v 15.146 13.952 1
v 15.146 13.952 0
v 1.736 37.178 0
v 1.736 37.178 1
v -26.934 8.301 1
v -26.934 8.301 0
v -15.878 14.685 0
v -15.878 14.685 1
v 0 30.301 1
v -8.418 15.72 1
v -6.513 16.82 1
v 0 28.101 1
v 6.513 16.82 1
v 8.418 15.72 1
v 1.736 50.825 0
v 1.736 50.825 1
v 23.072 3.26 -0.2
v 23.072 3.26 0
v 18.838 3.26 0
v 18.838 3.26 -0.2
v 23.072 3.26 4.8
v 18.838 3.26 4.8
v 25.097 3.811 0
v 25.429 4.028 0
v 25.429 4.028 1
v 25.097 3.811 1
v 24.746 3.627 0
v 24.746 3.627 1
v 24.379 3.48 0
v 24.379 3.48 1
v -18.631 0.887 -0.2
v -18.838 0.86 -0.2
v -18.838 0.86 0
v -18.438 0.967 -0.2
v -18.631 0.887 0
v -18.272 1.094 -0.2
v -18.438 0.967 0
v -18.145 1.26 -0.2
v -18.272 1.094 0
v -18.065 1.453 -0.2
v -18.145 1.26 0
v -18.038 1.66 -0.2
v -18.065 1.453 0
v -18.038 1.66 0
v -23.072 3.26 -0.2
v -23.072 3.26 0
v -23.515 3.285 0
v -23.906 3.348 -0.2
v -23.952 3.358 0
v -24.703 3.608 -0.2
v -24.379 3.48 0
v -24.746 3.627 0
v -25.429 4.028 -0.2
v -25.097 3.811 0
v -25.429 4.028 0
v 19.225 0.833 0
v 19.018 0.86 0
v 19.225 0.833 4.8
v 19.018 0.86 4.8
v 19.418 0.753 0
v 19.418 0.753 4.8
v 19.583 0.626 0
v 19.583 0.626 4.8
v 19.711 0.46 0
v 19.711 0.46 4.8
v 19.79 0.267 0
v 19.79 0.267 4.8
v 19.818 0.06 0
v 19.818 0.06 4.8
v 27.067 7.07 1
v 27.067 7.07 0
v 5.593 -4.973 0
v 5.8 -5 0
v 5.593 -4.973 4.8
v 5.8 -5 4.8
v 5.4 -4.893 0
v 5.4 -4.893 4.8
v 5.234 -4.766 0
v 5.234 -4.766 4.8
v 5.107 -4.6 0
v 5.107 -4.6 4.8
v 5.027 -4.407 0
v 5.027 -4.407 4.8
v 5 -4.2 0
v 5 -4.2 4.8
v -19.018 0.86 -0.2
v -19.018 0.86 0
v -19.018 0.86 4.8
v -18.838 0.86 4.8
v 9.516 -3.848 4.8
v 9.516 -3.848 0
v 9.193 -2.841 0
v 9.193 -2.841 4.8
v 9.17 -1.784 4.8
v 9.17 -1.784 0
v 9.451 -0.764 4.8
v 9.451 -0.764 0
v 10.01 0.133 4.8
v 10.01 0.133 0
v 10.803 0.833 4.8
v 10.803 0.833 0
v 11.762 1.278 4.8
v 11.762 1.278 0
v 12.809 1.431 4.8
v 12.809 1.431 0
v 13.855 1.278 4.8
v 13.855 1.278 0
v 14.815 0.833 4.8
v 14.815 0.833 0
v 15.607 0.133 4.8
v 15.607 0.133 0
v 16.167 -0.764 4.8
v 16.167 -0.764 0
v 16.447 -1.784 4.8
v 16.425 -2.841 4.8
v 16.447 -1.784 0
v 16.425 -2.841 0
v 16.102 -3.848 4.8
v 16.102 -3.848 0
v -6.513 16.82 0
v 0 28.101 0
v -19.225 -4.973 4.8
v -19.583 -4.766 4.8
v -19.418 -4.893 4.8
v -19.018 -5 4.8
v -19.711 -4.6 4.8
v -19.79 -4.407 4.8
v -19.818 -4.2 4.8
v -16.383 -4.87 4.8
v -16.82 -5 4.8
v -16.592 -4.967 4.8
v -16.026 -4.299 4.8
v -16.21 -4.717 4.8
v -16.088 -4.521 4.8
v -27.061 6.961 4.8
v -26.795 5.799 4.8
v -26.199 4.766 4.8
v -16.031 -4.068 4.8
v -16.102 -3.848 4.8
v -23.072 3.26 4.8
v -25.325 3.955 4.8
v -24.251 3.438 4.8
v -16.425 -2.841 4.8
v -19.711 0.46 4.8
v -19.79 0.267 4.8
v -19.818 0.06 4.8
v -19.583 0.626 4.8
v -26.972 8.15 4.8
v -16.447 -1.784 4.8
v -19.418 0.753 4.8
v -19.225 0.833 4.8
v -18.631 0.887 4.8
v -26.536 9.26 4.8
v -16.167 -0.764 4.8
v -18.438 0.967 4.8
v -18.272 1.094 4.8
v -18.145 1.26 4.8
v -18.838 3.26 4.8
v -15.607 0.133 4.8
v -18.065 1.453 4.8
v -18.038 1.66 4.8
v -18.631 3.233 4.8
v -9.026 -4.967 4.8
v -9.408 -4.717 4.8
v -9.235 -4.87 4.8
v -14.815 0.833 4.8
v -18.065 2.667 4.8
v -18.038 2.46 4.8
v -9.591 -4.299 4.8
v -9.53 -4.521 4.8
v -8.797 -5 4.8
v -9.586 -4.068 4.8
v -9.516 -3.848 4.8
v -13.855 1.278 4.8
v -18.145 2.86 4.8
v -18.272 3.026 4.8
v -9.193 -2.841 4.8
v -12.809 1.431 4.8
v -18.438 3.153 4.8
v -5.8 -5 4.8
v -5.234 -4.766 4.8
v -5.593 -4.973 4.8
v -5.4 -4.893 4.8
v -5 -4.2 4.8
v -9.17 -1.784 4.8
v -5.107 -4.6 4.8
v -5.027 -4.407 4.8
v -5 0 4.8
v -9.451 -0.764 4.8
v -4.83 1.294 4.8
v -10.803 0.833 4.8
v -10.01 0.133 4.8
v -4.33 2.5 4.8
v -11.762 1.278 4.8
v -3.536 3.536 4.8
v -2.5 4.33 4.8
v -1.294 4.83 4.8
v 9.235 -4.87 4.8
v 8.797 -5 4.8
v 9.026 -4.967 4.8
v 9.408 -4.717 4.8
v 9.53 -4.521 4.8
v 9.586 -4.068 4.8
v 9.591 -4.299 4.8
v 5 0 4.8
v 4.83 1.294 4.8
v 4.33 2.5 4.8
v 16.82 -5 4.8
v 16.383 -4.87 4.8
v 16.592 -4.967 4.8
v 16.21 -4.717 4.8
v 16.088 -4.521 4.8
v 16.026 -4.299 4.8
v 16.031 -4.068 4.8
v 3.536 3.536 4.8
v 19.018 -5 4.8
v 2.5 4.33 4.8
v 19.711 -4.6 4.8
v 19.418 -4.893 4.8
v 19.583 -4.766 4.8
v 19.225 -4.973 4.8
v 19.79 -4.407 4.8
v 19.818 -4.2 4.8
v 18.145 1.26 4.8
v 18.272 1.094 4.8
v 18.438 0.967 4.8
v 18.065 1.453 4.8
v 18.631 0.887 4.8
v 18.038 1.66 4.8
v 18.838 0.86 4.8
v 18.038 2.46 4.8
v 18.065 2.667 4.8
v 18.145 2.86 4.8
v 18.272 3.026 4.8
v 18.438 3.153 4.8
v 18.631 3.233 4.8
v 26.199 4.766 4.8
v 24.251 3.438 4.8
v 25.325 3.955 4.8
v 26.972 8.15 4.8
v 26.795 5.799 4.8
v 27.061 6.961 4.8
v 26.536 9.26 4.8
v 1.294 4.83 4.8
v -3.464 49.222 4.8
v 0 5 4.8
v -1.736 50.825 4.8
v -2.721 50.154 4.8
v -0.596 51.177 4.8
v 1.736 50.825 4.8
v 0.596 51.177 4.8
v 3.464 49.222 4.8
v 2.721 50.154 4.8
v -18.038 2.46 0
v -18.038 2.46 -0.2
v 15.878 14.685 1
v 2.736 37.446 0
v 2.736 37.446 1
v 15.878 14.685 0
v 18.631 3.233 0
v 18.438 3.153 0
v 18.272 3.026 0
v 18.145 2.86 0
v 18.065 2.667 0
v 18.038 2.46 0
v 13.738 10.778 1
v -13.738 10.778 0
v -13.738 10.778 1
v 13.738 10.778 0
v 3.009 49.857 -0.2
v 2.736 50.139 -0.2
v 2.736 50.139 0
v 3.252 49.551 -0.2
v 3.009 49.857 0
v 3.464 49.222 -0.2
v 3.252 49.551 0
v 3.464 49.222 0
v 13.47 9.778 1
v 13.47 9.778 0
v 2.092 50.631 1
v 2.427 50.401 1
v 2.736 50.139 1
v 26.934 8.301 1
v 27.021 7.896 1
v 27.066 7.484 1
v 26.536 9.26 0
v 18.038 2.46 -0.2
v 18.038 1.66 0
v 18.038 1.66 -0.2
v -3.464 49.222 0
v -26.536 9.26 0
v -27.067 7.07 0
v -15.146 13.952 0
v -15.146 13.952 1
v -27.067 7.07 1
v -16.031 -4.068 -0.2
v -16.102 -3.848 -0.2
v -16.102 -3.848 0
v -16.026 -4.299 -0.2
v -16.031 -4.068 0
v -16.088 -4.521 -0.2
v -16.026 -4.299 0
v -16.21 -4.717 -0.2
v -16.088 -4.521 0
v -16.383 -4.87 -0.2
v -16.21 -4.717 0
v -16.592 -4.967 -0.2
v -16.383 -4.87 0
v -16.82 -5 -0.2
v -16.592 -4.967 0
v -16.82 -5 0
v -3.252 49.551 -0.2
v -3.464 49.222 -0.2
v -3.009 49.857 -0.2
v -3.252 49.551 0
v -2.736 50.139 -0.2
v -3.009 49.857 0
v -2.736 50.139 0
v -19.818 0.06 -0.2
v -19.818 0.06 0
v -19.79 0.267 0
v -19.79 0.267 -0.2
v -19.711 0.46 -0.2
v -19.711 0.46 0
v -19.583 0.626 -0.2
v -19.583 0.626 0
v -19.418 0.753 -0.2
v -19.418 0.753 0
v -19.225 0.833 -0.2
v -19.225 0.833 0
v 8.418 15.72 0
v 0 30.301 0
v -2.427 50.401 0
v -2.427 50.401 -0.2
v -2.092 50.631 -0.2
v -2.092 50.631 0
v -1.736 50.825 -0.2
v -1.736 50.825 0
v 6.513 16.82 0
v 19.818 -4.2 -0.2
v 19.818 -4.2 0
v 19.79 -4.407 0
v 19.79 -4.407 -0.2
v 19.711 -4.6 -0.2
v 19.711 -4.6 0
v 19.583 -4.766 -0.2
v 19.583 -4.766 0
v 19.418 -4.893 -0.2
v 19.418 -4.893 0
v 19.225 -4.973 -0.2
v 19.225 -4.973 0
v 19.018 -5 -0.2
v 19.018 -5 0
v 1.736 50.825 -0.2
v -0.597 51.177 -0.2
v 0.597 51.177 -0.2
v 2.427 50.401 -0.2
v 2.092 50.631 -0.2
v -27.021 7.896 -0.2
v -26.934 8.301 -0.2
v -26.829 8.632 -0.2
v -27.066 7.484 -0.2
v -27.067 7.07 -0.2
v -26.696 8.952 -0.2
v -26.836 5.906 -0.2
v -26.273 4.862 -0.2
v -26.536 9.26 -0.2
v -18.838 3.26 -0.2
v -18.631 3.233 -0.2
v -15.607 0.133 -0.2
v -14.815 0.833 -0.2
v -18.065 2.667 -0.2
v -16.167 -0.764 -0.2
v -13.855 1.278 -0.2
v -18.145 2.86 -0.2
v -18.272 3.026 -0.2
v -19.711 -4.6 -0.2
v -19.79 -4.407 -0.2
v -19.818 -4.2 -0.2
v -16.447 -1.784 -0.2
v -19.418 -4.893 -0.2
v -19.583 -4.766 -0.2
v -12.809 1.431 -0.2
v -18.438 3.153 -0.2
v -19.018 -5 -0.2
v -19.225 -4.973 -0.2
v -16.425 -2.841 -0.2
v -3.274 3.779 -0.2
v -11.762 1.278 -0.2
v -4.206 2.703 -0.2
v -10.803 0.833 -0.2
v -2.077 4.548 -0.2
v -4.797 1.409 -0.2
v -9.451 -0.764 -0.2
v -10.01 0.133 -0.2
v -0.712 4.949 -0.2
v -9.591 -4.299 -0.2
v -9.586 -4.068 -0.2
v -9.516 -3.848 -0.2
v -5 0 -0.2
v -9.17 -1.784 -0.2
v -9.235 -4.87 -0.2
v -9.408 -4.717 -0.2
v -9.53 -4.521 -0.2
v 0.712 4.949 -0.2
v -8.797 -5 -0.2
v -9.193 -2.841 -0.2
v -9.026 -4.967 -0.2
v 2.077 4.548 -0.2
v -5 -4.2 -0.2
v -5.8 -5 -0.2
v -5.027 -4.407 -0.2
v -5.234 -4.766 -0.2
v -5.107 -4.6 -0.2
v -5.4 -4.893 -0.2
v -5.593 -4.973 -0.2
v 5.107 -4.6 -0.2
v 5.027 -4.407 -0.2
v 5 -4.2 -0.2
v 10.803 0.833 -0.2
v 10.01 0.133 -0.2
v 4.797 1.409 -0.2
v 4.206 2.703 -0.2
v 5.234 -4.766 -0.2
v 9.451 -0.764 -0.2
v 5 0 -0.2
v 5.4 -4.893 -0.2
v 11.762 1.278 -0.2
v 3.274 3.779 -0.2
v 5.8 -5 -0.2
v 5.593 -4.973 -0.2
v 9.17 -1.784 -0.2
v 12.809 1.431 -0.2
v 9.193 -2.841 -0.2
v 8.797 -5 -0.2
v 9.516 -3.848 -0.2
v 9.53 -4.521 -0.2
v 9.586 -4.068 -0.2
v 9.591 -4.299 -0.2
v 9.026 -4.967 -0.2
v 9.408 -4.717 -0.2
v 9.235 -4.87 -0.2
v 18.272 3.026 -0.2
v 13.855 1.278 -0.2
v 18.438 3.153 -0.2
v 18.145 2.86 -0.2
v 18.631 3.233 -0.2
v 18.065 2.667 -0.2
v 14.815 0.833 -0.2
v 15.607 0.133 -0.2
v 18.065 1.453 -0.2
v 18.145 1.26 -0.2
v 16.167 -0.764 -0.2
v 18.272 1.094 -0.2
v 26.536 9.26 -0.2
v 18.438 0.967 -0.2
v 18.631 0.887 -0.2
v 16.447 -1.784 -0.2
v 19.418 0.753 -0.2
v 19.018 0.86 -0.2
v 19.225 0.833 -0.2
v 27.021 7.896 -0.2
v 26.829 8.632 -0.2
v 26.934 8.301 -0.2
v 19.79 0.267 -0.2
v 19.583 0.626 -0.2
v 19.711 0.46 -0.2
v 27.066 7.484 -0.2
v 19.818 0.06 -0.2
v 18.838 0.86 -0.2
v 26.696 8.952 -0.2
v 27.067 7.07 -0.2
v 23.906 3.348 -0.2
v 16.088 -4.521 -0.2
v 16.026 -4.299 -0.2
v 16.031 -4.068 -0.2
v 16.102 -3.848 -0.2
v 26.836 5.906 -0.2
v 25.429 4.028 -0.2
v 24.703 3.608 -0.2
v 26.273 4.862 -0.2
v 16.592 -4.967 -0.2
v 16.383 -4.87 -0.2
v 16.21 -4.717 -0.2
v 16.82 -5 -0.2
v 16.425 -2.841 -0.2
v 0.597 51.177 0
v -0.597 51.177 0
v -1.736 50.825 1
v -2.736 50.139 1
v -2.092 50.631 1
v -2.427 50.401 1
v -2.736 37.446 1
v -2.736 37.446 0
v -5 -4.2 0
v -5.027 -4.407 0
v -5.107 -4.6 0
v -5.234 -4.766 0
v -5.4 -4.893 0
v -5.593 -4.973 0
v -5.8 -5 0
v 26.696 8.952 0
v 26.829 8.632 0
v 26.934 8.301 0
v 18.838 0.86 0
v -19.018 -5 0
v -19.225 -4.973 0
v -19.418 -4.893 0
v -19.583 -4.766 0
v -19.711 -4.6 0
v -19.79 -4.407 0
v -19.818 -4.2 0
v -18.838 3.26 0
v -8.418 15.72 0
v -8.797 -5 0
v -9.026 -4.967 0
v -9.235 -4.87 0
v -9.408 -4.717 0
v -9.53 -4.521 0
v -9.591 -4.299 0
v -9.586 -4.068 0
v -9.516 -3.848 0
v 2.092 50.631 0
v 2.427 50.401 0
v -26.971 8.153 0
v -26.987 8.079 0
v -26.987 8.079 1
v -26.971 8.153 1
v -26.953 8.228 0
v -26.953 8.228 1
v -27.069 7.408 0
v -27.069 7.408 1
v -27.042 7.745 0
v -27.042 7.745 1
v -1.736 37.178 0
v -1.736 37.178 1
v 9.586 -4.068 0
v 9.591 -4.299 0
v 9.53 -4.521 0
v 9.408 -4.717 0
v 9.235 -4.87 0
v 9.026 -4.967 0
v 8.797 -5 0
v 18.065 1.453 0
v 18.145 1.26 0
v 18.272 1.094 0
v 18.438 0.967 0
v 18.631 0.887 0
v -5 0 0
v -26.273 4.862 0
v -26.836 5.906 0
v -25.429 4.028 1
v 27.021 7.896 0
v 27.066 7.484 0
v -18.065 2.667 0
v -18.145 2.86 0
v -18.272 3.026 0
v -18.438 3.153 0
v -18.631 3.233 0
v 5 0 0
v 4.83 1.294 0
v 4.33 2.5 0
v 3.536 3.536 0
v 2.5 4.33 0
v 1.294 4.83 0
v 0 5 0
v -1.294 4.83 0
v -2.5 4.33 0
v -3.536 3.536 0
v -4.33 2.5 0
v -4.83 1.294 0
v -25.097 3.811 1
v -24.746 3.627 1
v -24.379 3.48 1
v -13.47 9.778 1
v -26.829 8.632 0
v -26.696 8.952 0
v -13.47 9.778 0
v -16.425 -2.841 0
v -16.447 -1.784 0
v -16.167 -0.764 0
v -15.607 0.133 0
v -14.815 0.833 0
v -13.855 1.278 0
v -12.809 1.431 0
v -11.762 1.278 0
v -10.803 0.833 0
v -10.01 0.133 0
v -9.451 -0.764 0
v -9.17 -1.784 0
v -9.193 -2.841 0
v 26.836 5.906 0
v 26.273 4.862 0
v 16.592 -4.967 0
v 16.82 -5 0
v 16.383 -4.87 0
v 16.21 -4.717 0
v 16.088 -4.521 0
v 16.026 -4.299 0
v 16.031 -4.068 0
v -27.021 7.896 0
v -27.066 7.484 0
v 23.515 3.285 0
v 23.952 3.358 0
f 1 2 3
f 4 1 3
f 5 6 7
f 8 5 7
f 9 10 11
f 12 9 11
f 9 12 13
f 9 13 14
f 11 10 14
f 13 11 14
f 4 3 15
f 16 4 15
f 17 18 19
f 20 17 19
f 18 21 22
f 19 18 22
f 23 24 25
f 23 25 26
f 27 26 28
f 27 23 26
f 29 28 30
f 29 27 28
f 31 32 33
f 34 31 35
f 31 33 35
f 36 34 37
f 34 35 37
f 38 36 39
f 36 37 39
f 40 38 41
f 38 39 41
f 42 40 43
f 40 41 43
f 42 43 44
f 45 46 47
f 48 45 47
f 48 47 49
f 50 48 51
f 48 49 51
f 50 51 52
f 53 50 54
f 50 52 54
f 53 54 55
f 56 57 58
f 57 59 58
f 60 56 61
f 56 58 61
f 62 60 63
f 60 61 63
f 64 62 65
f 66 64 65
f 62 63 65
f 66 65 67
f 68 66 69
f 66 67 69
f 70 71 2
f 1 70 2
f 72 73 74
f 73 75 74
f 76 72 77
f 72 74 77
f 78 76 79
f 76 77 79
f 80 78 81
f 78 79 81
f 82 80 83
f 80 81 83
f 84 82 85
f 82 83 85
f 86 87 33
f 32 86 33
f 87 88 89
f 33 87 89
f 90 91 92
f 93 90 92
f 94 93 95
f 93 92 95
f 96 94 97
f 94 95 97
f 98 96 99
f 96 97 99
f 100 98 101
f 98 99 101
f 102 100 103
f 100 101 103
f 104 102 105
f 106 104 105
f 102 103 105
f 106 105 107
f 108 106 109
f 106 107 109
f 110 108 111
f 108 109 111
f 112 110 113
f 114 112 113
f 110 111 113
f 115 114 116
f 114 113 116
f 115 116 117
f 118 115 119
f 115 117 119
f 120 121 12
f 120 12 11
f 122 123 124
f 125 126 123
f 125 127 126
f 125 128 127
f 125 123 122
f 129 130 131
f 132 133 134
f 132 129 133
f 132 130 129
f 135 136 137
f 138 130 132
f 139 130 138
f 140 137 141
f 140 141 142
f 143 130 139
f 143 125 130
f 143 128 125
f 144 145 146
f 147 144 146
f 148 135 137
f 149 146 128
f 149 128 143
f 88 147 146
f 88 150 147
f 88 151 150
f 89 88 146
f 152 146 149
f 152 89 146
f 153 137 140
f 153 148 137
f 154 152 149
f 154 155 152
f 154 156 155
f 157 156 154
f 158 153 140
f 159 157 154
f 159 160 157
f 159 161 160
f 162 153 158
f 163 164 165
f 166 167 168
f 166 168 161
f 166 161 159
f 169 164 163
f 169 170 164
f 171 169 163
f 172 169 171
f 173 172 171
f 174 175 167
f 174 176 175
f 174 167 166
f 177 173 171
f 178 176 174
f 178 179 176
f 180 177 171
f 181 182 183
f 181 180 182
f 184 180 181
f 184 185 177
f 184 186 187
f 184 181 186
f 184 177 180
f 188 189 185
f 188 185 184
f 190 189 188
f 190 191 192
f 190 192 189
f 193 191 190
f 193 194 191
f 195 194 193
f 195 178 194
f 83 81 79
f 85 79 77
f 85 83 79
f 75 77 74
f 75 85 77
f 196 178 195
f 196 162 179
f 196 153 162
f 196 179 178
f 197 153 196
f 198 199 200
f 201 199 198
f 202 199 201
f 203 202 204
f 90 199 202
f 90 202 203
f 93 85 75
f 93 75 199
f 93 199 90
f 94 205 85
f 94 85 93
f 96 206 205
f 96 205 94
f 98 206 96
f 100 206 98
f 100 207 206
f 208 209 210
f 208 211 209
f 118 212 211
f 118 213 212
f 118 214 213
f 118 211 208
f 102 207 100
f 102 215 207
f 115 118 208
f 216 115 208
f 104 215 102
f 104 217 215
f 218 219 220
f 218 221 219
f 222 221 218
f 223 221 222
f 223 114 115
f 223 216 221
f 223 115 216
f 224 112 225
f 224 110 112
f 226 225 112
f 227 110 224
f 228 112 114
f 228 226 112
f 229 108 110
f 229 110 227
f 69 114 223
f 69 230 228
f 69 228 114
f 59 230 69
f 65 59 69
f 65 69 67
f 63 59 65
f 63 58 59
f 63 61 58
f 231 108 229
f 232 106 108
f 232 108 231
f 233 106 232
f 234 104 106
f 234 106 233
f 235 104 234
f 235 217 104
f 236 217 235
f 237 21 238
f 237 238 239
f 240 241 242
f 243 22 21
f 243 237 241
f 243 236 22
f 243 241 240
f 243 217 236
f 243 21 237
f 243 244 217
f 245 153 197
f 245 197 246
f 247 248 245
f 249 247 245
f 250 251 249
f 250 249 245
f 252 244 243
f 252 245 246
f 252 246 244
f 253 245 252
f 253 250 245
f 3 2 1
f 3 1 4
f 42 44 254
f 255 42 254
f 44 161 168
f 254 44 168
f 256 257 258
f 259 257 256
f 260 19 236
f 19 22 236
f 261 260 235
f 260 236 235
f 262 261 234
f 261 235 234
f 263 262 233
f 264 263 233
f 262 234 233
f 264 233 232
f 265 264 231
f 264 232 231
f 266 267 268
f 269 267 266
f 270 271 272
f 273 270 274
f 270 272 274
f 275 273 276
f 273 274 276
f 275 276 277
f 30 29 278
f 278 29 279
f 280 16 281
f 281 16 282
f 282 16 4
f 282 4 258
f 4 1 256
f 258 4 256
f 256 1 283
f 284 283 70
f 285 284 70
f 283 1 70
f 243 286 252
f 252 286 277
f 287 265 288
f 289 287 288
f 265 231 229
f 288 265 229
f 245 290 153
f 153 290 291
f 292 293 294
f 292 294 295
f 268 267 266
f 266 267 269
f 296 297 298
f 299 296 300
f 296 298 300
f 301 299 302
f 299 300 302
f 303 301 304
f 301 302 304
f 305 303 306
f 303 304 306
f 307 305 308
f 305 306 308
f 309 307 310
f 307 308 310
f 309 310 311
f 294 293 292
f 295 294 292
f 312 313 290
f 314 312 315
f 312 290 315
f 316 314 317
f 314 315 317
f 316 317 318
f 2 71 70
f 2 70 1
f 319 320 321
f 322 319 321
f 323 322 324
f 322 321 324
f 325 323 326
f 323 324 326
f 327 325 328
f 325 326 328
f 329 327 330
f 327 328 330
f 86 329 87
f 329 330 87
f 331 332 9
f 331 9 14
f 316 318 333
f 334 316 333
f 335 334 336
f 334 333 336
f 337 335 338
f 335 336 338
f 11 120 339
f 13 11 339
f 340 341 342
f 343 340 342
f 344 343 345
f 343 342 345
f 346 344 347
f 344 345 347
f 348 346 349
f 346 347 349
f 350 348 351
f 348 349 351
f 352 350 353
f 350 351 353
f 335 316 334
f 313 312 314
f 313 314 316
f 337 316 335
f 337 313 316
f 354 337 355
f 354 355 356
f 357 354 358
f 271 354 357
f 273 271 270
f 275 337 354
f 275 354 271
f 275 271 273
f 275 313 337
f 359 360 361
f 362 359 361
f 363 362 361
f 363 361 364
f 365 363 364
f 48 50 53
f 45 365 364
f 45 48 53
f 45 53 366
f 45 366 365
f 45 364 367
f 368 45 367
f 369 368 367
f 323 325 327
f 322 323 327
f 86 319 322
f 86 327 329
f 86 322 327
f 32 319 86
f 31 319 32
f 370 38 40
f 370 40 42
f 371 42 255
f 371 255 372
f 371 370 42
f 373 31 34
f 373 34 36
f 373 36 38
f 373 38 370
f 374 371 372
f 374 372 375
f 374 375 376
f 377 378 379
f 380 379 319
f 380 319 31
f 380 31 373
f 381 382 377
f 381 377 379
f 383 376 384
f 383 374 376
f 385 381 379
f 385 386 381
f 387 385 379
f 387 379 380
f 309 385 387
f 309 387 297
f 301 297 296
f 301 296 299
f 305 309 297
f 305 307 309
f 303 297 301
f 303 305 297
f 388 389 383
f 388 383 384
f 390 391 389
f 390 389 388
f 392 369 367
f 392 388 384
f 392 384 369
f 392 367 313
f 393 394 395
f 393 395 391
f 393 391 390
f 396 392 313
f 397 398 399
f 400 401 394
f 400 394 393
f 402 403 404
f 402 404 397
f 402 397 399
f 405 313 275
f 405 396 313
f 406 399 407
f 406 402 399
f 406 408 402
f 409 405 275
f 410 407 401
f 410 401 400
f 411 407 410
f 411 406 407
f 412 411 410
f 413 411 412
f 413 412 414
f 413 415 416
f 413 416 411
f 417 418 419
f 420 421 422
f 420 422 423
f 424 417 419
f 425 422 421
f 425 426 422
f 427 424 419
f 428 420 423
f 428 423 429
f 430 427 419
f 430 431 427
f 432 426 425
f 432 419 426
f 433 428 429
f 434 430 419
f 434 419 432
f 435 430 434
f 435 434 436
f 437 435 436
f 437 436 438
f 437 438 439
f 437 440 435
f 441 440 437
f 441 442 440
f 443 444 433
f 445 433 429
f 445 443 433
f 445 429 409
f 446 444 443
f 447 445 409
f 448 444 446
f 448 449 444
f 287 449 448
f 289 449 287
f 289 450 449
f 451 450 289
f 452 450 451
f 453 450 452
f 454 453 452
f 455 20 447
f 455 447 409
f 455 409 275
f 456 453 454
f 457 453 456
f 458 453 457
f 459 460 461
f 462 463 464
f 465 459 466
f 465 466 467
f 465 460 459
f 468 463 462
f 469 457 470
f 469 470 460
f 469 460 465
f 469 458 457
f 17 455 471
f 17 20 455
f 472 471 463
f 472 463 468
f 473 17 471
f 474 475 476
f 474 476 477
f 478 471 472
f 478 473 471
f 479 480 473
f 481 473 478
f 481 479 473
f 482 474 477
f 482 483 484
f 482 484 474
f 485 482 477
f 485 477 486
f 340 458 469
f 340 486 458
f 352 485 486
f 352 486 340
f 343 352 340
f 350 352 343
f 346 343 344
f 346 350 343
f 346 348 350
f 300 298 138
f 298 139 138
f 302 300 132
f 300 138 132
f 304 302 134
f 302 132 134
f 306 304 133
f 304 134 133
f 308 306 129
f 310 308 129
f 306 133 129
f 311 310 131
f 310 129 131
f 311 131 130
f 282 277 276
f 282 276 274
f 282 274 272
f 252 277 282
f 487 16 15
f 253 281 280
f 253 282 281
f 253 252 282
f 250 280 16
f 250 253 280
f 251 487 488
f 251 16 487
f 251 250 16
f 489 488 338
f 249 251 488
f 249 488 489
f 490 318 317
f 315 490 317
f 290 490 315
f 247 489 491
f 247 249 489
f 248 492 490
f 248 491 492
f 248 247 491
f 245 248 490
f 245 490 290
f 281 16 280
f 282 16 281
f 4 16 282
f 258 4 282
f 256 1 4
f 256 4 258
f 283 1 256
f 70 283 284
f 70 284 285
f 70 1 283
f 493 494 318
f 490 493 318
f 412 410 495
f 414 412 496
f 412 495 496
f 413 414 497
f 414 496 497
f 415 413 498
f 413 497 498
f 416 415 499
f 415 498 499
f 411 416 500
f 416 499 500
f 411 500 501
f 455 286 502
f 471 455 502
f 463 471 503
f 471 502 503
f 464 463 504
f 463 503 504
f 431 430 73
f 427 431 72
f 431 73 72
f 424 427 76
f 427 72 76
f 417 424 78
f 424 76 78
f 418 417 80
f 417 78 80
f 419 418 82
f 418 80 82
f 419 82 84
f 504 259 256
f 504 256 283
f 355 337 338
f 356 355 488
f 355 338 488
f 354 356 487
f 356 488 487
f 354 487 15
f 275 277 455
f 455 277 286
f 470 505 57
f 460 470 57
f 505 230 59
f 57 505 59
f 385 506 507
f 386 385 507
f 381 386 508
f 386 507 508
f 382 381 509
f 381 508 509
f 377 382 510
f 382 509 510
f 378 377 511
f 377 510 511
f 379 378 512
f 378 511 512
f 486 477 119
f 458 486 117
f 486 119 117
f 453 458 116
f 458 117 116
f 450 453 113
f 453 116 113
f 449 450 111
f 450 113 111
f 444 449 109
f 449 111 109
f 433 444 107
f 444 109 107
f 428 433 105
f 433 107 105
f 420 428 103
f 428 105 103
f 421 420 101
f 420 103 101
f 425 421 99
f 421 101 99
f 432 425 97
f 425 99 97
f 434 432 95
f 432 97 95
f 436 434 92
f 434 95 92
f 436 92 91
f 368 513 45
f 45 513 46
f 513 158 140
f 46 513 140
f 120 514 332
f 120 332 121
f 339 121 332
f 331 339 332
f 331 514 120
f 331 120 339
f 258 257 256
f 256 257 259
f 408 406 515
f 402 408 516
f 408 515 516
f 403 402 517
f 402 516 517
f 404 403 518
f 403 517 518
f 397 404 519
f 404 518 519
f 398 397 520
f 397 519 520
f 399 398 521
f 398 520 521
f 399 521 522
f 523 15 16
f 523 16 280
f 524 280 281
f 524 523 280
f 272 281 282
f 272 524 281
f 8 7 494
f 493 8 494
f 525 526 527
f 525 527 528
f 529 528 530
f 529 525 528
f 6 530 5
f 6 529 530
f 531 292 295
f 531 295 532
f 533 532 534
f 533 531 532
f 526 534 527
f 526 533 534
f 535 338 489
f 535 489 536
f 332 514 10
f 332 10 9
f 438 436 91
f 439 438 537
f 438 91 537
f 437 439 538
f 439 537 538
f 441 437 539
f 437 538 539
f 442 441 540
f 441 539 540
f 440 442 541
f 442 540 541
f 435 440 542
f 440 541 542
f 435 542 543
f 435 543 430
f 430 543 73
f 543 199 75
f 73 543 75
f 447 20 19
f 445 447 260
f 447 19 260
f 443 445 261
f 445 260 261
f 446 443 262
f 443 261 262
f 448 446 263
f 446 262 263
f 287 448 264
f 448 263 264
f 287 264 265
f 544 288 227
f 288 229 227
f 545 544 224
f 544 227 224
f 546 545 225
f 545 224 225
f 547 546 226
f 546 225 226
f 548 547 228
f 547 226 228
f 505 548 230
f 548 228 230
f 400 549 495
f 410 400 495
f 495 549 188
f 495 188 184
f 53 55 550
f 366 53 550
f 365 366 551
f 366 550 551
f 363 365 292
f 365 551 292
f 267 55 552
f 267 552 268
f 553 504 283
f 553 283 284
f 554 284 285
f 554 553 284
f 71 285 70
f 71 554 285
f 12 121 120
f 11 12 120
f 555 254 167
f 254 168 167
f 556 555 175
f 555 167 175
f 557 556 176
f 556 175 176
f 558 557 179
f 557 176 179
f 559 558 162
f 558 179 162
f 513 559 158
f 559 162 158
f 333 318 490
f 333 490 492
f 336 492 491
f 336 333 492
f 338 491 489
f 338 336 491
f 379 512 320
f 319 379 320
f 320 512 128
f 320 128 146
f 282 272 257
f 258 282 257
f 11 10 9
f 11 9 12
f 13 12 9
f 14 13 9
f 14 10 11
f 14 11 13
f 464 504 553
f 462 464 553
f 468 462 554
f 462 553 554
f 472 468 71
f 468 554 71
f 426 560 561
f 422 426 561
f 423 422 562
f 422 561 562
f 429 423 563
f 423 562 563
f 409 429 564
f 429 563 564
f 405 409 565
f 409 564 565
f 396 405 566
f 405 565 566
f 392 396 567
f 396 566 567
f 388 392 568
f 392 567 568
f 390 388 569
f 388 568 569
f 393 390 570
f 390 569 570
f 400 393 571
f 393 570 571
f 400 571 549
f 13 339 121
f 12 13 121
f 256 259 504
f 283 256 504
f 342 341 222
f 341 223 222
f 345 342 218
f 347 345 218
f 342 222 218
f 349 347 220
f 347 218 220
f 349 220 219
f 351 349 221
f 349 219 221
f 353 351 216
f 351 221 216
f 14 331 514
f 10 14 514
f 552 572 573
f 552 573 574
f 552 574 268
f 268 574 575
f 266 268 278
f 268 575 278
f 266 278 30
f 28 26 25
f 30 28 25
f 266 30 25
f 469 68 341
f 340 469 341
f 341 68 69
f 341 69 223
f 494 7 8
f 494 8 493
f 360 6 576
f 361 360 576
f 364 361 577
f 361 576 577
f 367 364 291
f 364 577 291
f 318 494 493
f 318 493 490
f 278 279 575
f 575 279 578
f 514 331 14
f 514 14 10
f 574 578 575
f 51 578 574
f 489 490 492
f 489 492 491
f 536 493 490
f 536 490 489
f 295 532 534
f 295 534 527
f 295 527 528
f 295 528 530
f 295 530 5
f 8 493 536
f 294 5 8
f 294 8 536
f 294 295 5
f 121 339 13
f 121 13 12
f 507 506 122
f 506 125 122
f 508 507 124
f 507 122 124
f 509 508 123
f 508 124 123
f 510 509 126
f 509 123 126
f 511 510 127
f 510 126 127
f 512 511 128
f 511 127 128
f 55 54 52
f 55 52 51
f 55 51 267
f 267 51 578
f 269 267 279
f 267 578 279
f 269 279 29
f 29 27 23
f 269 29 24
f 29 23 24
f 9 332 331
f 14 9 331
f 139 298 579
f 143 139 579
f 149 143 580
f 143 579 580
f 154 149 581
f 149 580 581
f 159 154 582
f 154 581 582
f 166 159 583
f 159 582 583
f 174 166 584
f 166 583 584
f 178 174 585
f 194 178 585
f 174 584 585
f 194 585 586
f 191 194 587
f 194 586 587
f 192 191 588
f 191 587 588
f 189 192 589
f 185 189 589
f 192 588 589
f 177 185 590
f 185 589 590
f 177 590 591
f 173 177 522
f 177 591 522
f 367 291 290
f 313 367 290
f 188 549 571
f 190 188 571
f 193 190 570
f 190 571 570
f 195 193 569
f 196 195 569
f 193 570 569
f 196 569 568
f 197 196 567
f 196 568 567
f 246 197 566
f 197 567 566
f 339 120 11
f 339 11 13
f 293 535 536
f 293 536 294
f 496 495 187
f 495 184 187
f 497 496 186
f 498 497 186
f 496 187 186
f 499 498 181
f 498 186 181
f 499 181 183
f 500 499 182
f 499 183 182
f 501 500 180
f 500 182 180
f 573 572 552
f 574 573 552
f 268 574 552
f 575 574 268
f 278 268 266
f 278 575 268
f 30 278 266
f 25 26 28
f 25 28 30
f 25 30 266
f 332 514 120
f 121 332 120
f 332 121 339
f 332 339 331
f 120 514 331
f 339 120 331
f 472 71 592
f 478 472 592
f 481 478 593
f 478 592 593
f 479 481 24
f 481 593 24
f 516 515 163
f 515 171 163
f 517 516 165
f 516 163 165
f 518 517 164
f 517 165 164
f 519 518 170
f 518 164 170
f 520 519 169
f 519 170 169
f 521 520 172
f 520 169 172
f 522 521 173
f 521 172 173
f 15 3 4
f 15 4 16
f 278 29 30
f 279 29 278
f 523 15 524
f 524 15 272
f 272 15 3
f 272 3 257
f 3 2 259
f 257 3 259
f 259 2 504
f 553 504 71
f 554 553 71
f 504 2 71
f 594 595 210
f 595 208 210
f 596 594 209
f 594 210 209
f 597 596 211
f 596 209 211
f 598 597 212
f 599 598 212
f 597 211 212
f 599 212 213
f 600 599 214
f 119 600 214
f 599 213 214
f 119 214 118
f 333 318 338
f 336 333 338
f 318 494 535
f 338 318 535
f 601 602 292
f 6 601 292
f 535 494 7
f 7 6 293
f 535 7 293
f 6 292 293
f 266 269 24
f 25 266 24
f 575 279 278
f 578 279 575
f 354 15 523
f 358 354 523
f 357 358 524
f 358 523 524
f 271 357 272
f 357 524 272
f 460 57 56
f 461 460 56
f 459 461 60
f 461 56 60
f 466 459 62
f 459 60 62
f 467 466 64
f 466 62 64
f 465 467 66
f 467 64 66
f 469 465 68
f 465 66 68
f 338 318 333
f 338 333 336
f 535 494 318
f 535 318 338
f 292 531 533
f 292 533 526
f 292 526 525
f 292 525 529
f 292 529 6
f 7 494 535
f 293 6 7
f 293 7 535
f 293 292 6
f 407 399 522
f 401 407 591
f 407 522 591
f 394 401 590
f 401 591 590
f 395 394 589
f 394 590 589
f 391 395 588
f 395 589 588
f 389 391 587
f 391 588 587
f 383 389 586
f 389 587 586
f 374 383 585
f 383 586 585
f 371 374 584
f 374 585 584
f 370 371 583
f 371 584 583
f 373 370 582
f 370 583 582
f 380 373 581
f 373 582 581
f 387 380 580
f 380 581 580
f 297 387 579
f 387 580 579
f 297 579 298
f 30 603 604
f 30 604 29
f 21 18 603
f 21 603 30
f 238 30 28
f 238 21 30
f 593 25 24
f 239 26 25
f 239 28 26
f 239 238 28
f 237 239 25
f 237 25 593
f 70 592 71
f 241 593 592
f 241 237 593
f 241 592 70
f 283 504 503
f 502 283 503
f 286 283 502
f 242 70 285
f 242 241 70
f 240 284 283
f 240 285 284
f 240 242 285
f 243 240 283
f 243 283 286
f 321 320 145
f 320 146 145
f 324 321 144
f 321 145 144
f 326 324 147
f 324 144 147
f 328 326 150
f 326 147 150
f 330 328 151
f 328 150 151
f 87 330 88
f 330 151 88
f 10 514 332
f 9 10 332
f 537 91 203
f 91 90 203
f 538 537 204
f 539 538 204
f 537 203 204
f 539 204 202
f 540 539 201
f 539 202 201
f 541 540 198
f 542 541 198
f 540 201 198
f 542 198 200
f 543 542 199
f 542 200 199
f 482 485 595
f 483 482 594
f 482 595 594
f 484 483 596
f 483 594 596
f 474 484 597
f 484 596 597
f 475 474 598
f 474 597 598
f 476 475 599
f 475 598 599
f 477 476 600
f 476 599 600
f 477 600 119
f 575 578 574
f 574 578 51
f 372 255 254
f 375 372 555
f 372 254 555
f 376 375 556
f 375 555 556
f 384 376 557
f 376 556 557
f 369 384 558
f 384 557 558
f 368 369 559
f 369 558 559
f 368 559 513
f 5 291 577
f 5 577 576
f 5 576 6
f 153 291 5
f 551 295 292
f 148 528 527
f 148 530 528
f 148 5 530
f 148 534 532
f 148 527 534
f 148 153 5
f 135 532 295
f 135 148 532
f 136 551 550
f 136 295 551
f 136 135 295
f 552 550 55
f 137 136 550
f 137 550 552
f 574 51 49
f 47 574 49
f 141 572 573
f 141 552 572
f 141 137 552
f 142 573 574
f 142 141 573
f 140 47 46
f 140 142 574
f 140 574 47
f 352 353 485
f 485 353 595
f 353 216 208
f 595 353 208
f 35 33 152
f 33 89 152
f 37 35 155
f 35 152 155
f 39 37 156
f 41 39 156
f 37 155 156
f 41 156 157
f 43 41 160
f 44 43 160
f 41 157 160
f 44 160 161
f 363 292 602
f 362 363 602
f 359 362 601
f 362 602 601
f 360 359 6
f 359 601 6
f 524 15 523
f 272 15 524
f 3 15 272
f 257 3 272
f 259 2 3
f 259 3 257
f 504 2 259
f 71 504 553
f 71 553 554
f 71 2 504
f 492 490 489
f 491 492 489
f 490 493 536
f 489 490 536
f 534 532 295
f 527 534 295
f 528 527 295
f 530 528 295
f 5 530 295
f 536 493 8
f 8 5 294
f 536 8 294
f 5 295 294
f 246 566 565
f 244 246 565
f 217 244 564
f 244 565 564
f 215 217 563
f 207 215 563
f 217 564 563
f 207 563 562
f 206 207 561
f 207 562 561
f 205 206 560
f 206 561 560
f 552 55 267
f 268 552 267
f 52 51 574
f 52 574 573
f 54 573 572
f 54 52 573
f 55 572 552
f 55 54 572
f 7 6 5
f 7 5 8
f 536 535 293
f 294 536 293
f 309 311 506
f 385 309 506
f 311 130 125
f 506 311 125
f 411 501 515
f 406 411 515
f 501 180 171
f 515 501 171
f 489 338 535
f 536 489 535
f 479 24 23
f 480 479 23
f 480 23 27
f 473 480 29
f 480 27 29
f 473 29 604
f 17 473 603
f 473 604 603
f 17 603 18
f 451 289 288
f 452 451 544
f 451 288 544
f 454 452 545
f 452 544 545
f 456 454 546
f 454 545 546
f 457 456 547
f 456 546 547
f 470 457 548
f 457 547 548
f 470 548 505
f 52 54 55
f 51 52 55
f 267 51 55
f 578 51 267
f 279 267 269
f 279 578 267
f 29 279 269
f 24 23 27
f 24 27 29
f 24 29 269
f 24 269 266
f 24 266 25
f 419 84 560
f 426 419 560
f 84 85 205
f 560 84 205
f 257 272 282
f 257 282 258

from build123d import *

# Parameters (mm, degrees)
F1_DEPTH = 4.8
F2_R     = 4
F4_DEPTH = 1
F5_DEPTH = 1
F6_R     = 0.8
F8_DEPTH = 0.2


# Not quite as in the source:
# - after a boolean that leaves OpenCascade's solid faulty, fix() repairs it


with BuildPart() as f1:
    # F0 (on Top) → F1 (new body)
    with BuildSketch(Plane.XY):
        with BuildLine():
            ThreePointArc((-5, 0), (-3.5355339059, 3.5355339059), (0, 5))
            ThreePointArc((0, 5), (3.5355339059, 3.5355339059), (5, 0))
            Line((5, 0), (5, -5))
            Line((5, -5), (10.4, -5))
            ThreePointArc((10.4, -5), (12.8088644564, 1.4307314955), (15.2177289128, -5))
            Line((15.2177289128, -5), (19.8177289128, -5))
            Line((19.8177289128, -5), (19.8177289128, 0.86))
            Line((19.8177289128, 0.86), (18.0377289128, 0.86))
            Line((18.0377289128, 0.86), (18.0377289128, 3.26))
            Line((18.0377289128, 3.26), (30, 3.26))
            Line((30, 3.26), (0, 55.2215242271))
            Line((0, 55.2215242271), (-30, 3.26))
            Line((-30, 3.26), (-18.0377289128, 3.26))
            Line((-18.0377289128, 3.26), (-18.0377289128, 0.86))
            Line((-18.0377289128, 0.86), (-19.8177289128, 0.86))
            Line((-19.8177289128, 0.86), (-19.8177289128, -5))
            Line((-19.8177289128, -5), (-15.2177289128, -5))
            ThreePointArc((-15.2177289128, -5), (-12.8088644564, 1.4307314955), (-10.4, -5))
            Line((-10.4, -5), (-5, -5))
            Line((-5, -5), (-5, 0))
        make_face()
    extrude(amount=F1_DEPTH)

    # F2
    f2_edges = [f1.edges().sort_by_distance(p)[0] for p in [
        (30, 3.26, 2.4),
        (0, 55.221524, 2.4),
        (-30, 3.26, 2.4),
    ]]
    fillet(f2_edges, radius=F2_R)

    # F3 (on face) → F4 (cut)
    with BuildSketch(Plane(origin=(0, 0, 0), x_dir=(1, 0, 0), z_dir=(0, 0, -1))):
        with BuildLine():
            Line((0, -9.7778161764), (0, -10.7778161764))
            Line((0, -10.7778161764), (13.737784962, -10.7778161764))
            Line((13.737784962, -10.7778161764), (25.4286516784, -4.0280911307))
            ThreePointArc((25.4286516784, -4.0280911307), (24.9241250755, -3.714738395), (24.3787619235, -3.4795447249))
            Line((24.3787619235, -3.4795447249), (13.4698357696, -9.7778161764))
            Line((13.4698357696, -9.7778161764), (0, -9.7778161764))
        make_face()
        with BuildLine():
            Line((-13.737784962, -10.7778161764), (0, -10.7778161764))
            Line((0, -10.7778161764), (0, -9.7778161764))
            Line((0, -9.7778161764), (-13.4698357696, -9.7778161764))
            Line((-13.4698357696, -9.7778161764), (-24.3787619235, -3.4795447249))
            ThreePointArc((-24.3787619235, -3.4795447249), (-24.9241250755, -3.714738395), (-25.4286516784, -4.0280911307))
            Line((-25.4286516784, -4.0280911307), (-13.737784962, -10.7778161764))
        make_face()
        with BuildLine():
            Line((1.7364629899, -37.1782497502), (1.7364629899, -50.8249526341))
            ThreePointArc((1.7364629899, -50.8249526341), (2.2626076246, -50.5201006984), (2.7364629899, -50.1390180668))
            Line((2.7364629899, -50.1390180668), (2.7364629899, -37.4461989427))
            Line((2.7364629899, -37.4461989427), (15.8779147563, -14.6845367981))
            Line((15.8779147563, -14.6845367981), (26.9338580546, -8.3013849587))
            ThreePointArc((26.9338580546, -8.3013849587), (27.0485392273, -7.6907196607), (27.0672656117, -7.0696615313))
            Line((27.0672656117, -7.0696615313), (15.1458639487, -13.9524859905))
            Line((15.1458639487, -13.9524859905), (1.7364629899, -37.1782497502))
        make_face()
        Polygon((8.4182686231, -15.72021842), (0, -15.72021842), (0, -16.8202612549), (6.5129385426, -16.8202612549), (0, -28.1010017173), (0, -30.301087387), align=None)
        Polygon((0, -16.8202612549), (0, -15.72021842), (-8.4182686231, -15.72021842), (0, -30.301087387), (0, -28.1010017173), (-6.5129385426, -16.8202612549), align=None)
        with BuildLine():
            Line((-15.1458639487, -13.9524859905), (-27.0672656117, -7.0696615313))
            ThreePointArc((-27.0672656117, -7.0696615313), (-27.0592311738, -7.5768073123), (-26.9870834272, -8.0788592001))
            ThreePointArc((-26.9870834272, -8.0788592001), (-26.962062144, -8.1905027231), (-26.9338580546, -8.3013849587))
            Line((-26.9338580546, -8.3013849587), (-15.8779147563, -14.6845367981))
            Line((-15.8779147563, -14.6845367981), (-2.7364629899, -37.4461989427))
            Line((-2.7364629899, -37.4461989427), (-2.7364629899, -50.1390180668))
            ThreePointArc((-2.7364629899, -50.1390180668), (-2.2626076246, -50.5201006984), (-1.7364629899, -50.8249526341))
            Line((-1.7364629899, -50.8249526341), (-1.7364629899, -37.1782497502))
            Line((-1.7364629899, -37.1782497502), (-15.1458639487, -13.9524859905))
        make_face()
    extrude(amount=-F4_DEPTH, mode=Mode.SUBTRACT)

    # F6
    f6_edges = [f1.edges().sort_by_distance(p)[0] for p in [
        (18.037729, 3.26, 2.4),
        (18.037729, 0.86, 2.4),
        (19.817729, 0.86, 2.4),
        (19.817729, -5, 2.4),
        (15.217729, -5, 2.4),
        (10.4, -5, 2.4),
        (5, -5, 2.4),
        (-5, -5, 2.4),
        (-10.4, -5, 2.4),
        (-15.217729, -5, 2.4),
        (-19.817729, -5, 2.4),
        (-19.817729, 0.86, 2.4),
        (-18.037729, 0.86, 2.4),
        (-18.037729, 3.26, 2.4),
    ]]
    fillet(f6_edges, radius=F6_R)

    # F7 (on face) → F8 (join)
    with BuildSketch(Plane(origin=(0, 0, 0), x_dir=(1, 0, 0), z_dir=(0, 0, -1))):
        with BuildLine():
            Line((3.4641016151, -49.2215242271), (26.5358983849, -9.26))
            ThreePointArc((26.5358983849, -9.26), (26.7661033905, -8.793655304), (26.9338580546, -8.3013849587))
            ThreePointArc((26.9338580546, -8.3013849587), (27.0485392273, -7.6907196607), (27.0672656117, -7.0696615313))
            ThreePointArc((27.0672656117, -7.0696615313), (26.5932725802, -5.3628420951), (25.4286516784, -4.0280911307))
            ThreePointArc((25.4286516784, -4.0280911307), (24.9241250755, -3.714738395), (24.3787619235, -3.4795447249))
            Line((24.3787619235, -3.4795447249), (13.4698357696, -9.7778161764))
            Line((13.4698357696, -9.7778161764), (-13.4698357696, -9.7778161764))
            Line((-13.4698357696, -9.7778161764), (-24.3787619235, -3.4795447249))
            ThreePointArc((-24.3787619235, -3.4795447249), (-24.9241250755, -3.714738395), (-25.4286516784, -4.0280911307))
            ThreePointArc((-25.4286516784, -4.0280911307), (-26.5932725802, -5.3628420951), (-27.0672656117, -7.0696615313))
            ThreePointArc((-27.0672656117, -7.0696615313), (-27.0485392273, -7.6907196607), (-26.9338580546, -8.3013849587))
            ThreePointArc((-26.9338580546, -8.3013849587), (-26.7661033905, -8.793655304), (-26.5358983849, -9.26))
            Line((-26.5358983849, -9.26), (-3.4641016151, -49.2215242271))
            ThreePointArc((-3.4641016151, -49.2215242271), (-3.1340387828, -49.7070424644), (-2.7364629899, -50.1390180668))
            ThreePointArc((-2.7364629899, -50.1390180668), (-2.2626076246, -50.5201006984), (-1.7364629899, -50.8249526341))
            ThreePointArc((-1.7364629899, -50.8249526341), (0, -51.2215242271), (1.7364629899, -50.8249526341))
            ThreePointArc((1.7364629899, -50.8249526341), (2.2626076246, -50.5201006984), (2.7364629899, -50.1390180668))
            ThreePointArc((2.7364629899, -50.1390180668), (3.1340387828, -49.7070424644), (3.4641016151, -49.2215242271))
        make_face()
        with BuildLine():
            Line((13.4698357696, -9.7778161764), (24.3787619235, -3.4795447249))
            ThreePointArc((24.3787619235, -3.4795447249), (23.7344350193, -3.3152680002), (23.0717967697, -3.26))
            Line((23.0717967697, -3.26), (18.8377289128, -3.26))
            ThreePointArc((18.8377289128, -3.26), (18.2720434879, -3.0256854249), (18.0377289128, -2.46))
            Line((18.0377289128, -2.46), (18.0377289128, -1.66))
            ThreePointArc((18.0377289128, -1.66), (18.2720434879, -1.0943145751), (18.8377289128, -0.86))
            Line((18.8377289128, -0.86), (19.0177289128, -0.86))
            ThreePointArc((19.0177289128, -0.86), (19.5834143378, -0.6256854249), (19.8177289128, -0.06))
            Line((19.8177289128, -0.06), (19.8177289128, 4.2))
            ThreePointArc((19.8177289128, 4.2), (19.5834143378, 4.7656854249), (19.0177289128, 5))
            Line((19.0177289128, 5), (16.8203228399, 5))
            ThreePointArc((16.8203228399, 5), (16.1415568612, 4.623410848), (16.1018306433, 3.8481918655))
            ThreePointArc((16.1018306433, 3.8481918655), (12.8088644564, -1.4307314955), (9.5158982695, 3.8481918655))
            ThreePointArc((9.5158982695, 3.8481918655), (9.4761720516, 4.623410848), (8.797406073, 5))
            Line((8.797406073, 5), (5.8, 5))
            ThreePointArc((5.8, 5), (5.2343145751, 4.7656854249), (5, 4.2))
            Line((5, 4.2), (5, 0))
            ThreePointArc((5, 0), (0, -5), (-5, 0))
            Line((-5, 0), (-5, 4.2))
            ThreePointArc((-5, 4.2), (-5.2343145751, 4.7656854249), (-5.8, 5))
            Line((-5.8, 5), (-8.797406073, 5))
            ThreePointArc((-8.797406073, 5), (-9.4761720516, 4.623410848), (-9.5158982695, 3.8481918655))
            ThreePointArc((-9.5158982695, 3.8481918655), (-12.8088644564, -1.4307314955), (-16.1018306433, 3.8481918655))
            ThreePointArc((-16.1018306433, 3.8481918655), (-16.1415568612, 4.623410848), (-16.8203228399, 5))
            Line((-16.8203228399, 5), (-19.0177289128, 5))
            ThreePointArc((-19.0177289128, 5), (-19.5834143378, 4.7656854249), (-19.8177289128, 4.2))
            Line((-19.8177289128, 4.2), (-19.8177289128, -0.06))
            ThreePointArc((-19.8177289128, -0.06), (-19.5834143378, -0.6256854249), (-19.0177289128, -0.86))
            Line((-19.0177289128, -0.86), (-18.8377289128, -0.86))
            ThreePointArc((-18.8377289128, -0.86), (-18.2720434879, -1.0943145751), (-18.0377289128, -1.66))
            Line((-18.0377289128, -1.66), (-18.0377289128, -2.46))
            ThreePointArc((-18.0377289128, -2.46), (-18.2720434879, -3.0256854249), (-18.8377289128, -3.26))
            Line((-18.8377289128, -3.26), (-23.0717967697, -3.26))
            ThreePointArc((-23.0717967697, -3.26), (-23.7344350193, -3.3152680002), (-24.3787619235, -3.4795447249))
            Line((-24.3787619235, -3.4795447249), (-13.4698357696, -9.7778161764))
            Line((-13.4698357696, -9.7778161764), (13.4698357696, -9.7778161764))
        make_face()
    extrude(amount=F8_DEPTH)

    add(f1.part.fix(), mode=Mode.REPLACE)


with BuildPart() as f5:
    # F3 (on face) → F5 (new body)
    with BuildSketch(Plane(origin=(0, 0, 0), x_dir=(1, 0, 0), z_dir=(0, 0, -1))):
        with BuildLine():
            Line((0, -9.7778161764), (0, -10.7778161764))
            Line((0, -10.7778161764), (13.737784962, -10.7778161764))
            Line((13.737784962, -10.7778161764), (25.4286516784, -4.0280911307))
            ThreePointArc((25.4286516784, -4.0280911307), (24.9241250755, -3.714738395), (24.3787619235, -3.4795447249))
            Line((24.3787619235, -3.4795447249), (13.4698357696, -9.7778161764))
            Line((13.4698357696, -9.7778161764), (0, -9.7778161764))
        make_face()
        with BuildLine():
            Line((-13.737784962, -10.7778161764), (0, -10.7778161764))
            Line((0, -10.7778161764), (0, -9.7778161764))
            Line((0, -9.7778161764), (-13.4698357696, -9.7778161764))
            Line((-13.4698357696, -9.7778161764), (-24.3787619235, -3.4795447249))
            ThreePointArc((-24.3787619235, -3.4795447249), (-24.9241250755, -3.714738395), (-25.4286516784, -4.0280911307))
            Line((-25.4286516784, -4.0280911307), (-13.737784962, -10.7778161764))
        make_face()
    extrude(amount=-F5_DEPTH)


with BuildPart() as f5b:
    # F3 (on face) → F5, piece 2 (new body)
    with BuildSketch(Plane(origin=(0, 0, 0), x_dir=(1, 0, 0), z_dir=(0, 0, -1))):
        with BuildLine():
            Line((1.7364629899, -37.1782497502), (1.7364629899, -50.8249526341))
            ThreePointArc((1.7364629899, -50.8249526341), (2.2626076246, -50.5201006984), (2.7364629899, -50.1390180668))
            Line((2.7364629899, -50.1390180668), (2.7364629899, -37.4461989427))
            Line((2.7364629899, -37.4461989427), (15.8779147563, -14.6845367981))
            Line((15.8779147563, -14.6845367981), (26.9338580546, -8.3013849587))
            ThreePointArc((26.9338580546, -8.3013849587), (27.0485392273, -7.6907196607), (27.0672656117, -7.0696615313))
            Line((27.0672656117, -7.0696615313), (15.1458639487, -13.9524859905))
            Line((15.1458639487, -13.9524859905), (1.7364629899, -37.1782497502))
        make_face()
    extrude(amount=-F5_DEPTH)


with BuildPart() as f5c:
    # F3 (on face) → F5, piece 3 (new body)
    with BuildSketch(Plane(origin=(0, 0, 0), x_dir=(1, 0, 0), z_dir=(0, 0, -1))):
        Polygon((8.4182686231, -15.72021842), (0, -15.72021842), (0, -16.8202612549), (6.5129385426, -16.8202612549), (0, -28.1010017173), (0, -30.301087387), align=None)
        Polygon((0, -16.8202612549), (0, -15.72021842), (-8.4182686231, -15.72021842), (0, -30.301087387), (0, -28.1010017173), (-6.5129385426, -16.8202612549), align=None)
    extrude(amount=-F5_DEPTH)


with BuildPart() as f5d:
    # F3 (on face) → F5, piece 4 (new body)
    with BuildSketch(Plane(origin=(0, 0, 0), x_dir=(1, 0, 0), z_dir=(0, 0, -1))):
        with BuildLine():
            Line((-15.1458639487, -13.9524859905), (-27.0672656117, -7.0696615313))
            ThreePointArc((-27.0672656117, -7.0696615313), (-27.0592311738, -7.5768073123), (-26.9870834272, -8.0788592001))
            ThreePointArc((-26.9870834272, -8.0788592001), (-26.962062144, -8.1905027231), (-26.9338580546, -8.3013849587))
            Line((-26.9338580546, -8.3013849587), (-15.8779147563, -14.6845367981))
            Line((-15.8779147563, -14.6845367981), (-2.7364629899, -37.4461989427))
            Line((-2.7364629899, -37.4461989427), (-2.7364629899, -50.1390180668))
            ThreePointArc((-2.7364629899, -50.1390180668), (-2.2626076246, -50.5201006984), (-1.7364629899, -50.8249526341))
            Line((-1.7364629899, -50.8249526341), (-1.7364629899, -37.1782497502))
            Line((-1.7364629899, -37.1782497502), (-15.1458639487, -13.9524859905))
        make_face()
    extrude(amount=-F5_DEPTH)


solid = Compound([f1.part, f5.part, f5b.part, f5c.part, f5d.part])
